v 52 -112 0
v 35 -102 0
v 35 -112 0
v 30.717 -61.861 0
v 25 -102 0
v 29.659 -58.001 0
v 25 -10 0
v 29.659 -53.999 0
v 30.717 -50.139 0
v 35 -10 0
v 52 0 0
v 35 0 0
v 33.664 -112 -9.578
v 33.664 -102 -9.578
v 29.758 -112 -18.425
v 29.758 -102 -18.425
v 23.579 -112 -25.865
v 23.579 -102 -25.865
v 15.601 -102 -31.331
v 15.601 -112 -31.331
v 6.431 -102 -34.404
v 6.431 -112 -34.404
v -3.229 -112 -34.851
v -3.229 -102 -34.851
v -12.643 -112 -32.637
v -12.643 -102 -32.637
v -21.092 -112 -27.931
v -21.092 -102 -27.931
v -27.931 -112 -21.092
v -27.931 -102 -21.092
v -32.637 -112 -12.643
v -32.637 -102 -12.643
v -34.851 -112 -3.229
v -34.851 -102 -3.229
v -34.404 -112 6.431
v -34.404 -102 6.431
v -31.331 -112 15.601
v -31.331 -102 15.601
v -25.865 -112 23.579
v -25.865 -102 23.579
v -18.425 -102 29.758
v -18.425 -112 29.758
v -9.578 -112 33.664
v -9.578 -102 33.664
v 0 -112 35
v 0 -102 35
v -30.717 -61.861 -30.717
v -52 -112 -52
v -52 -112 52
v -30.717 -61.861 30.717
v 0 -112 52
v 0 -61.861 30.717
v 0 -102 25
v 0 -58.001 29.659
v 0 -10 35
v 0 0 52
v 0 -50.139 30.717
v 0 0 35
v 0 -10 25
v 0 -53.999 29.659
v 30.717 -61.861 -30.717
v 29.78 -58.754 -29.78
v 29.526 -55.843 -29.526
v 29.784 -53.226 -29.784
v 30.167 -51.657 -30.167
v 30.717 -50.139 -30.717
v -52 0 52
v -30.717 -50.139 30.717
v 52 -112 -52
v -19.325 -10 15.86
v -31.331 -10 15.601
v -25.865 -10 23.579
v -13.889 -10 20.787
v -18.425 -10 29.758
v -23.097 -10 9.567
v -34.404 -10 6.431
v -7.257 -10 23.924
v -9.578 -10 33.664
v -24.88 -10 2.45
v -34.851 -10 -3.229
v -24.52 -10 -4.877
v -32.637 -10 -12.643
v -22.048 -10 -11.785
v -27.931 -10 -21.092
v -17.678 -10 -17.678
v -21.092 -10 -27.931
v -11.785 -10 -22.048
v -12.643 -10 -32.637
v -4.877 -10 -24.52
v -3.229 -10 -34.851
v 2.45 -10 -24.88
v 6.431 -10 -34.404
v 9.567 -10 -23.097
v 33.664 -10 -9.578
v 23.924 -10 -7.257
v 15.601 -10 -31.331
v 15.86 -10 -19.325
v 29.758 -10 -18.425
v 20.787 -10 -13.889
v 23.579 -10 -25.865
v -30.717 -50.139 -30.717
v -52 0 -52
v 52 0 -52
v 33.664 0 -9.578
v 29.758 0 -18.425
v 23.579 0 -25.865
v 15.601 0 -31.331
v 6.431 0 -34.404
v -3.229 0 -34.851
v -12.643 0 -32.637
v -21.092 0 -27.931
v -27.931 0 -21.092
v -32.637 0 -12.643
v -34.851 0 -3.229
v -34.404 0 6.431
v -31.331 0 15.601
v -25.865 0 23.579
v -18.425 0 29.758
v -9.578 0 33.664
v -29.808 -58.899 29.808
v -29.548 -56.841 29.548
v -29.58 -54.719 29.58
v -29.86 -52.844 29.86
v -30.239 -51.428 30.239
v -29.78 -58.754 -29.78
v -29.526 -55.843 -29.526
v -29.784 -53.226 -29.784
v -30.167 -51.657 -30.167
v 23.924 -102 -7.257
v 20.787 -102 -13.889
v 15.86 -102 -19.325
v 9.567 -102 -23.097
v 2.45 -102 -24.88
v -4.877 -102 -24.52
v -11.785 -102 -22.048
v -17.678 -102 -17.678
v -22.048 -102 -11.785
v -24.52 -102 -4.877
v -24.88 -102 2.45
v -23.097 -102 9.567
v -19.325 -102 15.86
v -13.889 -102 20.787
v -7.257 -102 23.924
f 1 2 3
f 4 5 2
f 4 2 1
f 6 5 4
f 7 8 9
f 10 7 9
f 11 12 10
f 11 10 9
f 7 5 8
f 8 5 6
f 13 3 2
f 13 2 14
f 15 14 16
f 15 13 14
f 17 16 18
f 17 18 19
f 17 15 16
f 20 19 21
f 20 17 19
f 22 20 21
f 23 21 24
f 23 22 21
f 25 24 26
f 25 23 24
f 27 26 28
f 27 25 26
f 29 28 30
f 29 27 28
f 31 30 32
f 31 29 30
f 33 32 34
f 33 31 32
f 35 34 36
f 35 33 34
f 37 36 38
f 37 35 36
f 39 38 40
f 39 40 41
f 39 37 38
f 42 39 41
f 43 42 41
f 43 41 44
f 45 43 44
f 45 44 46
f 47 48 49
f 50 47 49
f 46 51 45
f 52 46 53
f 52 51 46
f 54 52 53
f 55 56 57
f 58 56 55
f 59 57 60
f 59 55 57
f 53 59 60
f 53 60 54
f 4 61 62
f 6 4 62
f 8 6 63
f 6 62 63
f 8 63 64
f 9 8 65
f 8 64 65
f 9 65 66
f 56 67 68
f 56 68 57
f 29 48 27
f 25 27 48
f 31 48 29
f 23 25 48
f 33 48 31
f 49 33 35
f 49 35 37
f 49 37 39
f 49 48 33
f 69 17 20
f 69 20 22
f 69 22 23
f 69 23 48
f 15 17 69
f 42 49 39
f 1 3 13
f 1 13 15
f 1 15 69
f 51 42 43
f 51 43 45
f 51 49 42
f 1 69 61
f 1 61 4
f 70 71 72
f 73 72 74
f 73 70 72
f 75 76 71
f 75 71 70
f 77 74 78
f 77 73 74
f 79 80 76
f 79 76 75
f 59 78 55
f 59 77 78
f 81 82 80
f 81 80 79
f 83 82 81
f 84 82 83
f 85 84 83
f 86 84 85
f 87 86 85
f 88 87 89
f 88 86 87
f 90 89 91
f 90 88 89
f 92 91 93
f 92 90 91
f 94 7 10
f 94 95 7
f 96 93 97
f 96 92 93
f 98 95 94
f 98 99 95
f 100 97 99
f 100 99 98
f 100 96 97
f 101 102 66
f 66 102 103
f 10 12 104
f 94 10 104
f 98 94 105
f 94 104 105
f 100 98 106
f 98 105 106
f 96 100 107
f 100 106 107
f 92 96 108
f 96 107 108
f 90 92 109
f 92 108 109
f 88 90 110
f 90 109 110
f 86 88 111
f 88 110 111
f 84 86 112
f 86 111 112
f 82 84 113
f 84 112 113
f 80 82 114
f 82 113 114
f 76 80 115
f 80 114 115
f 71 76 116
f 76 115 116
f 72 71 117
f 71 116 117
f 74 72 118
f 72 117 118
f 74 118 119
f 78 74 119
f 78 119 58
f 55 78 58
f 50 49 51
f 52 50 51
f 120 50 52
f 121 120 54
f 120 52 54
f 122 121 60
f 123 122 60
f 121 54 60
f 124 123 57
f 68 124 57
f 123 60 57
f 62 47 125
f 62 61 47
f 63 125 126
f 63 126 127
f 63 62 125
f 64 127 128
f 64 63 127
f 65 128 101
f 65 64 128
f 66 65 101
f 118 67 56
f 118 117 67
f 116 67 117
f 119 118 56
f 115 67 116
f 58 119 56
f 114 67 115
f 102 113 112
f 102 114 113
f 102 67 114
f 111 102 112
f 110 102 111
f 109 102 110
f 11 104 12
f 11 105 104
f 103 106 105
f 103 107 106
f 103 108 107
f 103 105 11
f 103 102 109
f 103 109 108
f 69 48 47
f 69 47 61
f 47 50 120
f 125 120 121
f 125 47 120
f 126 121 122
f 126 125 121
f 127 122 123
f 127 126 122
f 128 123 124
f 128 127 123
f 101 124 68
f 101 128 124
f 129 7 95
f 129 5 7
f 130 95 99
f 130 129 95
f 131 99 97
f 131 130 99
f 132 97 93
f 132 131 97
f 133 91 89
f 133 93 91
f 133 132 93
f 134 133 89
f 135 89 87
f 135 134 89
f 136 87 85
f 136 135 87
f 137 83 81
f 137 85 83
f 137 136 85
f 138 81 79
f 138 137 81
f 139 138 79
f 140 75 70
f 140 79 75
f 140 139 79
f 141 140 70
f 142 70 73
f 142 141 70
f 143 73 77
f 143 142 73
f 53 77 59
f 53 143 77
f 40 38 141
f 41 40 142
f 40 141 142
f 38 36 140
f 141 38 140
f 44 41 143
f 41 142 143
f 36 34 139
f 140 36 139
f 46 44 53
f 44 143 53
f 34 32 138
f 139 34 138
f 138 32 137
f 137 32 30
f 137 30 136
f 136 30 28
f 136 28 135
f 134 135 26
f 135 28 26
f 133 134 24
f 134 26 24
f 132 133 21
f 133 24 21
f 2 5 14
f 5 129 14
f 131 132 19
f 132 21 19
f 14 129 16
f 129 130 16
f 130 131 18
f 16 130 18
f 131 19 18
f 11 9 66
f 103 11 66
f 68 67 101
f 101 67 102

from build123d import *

# Parameters (mm, degrees)
ESQUISSE1_W                  = 104
ESQUISSE1_H                  = 104
BOSS_EXTRU_2_DEPTH           = 56
BOSS_EXTRU_2_DRAFT           = -23
SYM_TRIE1_COPY_1_SKETCH_W    = 104
SYM_TRIE1_COPY_1_SKETCH_H    = 104
SYM_TRIE1_COPY_1_DEPTH       = 56
SYM_TRIE1_COPY_1_DRAFT       = -23
ENL_V_MAT_EXTRU_1_DEPTH      = 134.985073796
ENL_V_MAT_EXTRU_1_DEPTH_BACK = 134.985073796
ESQUISSE2_R                  = 25
CONG_1_R                     = 15
ESQUISSE3_W                  = 52
ESQUISSE3_H                  = 52
ENL_V_MAT_EXTRU_2_DEPTH      = 134.985073796
ESQUISSE4_R                  = 35
ENL_V_MAT_EXTRU_3_DEPTH      = 10


with BuildPart() as part:
    # Esquisse1 → Boss.-Extru.2 (with draft: the straight prism first)
    with BuildSketch(Plane(origin=(0, 0, 0), x_dir=(1, 0, 0), z_dir=(0, 1, 0))):
        Rectangle(ESQUISSE1_W, ESQUISSE1_H)
    extrude(amount=-BOSS_EXTRU_2_DEPTH)
    # Boss.-Extru.2: the draft: its side faces are tilted about the plane it starts from
    boss_extru_2_sides = [part.faces().sort_by_distance(p)[0] for p in [
        (-52, -28, 0),
        (0, -28, 52),
        (52, -28, 0),
        (0, -28, -52),
    ]]
    draft(boss_extru_2_sides, Plane(origin=(0, 0, 0), x_dir=(1, 0, 0), z_dir=(0, 1, 0)), BOSS_EXTRU_2_DRAFT)


with BuildPart() as sym_trie1_copy_1_tool:
    # Symétrie1 copy 1 sketch → Symétrie1 copy 1 (with draft: the straight prism first)
    with BuildSketch(Plane.XZ.offset(112)):
        Rectangle(SYM_TRIE1_COPY_1_SKETCH_W, SYM_TRIE1_COPY_1_SKETCH_H)
    extrude(amount=-SYM_TRIE1_COPY_1_DEPTH)
    # Symétrie1 copy 1: the draft: its side faces are tilted about the plane it starts from
    sym_trie1_copy_1_sides = [sym_trie1_copy_1_tool.faces().sort_by_distance(p)[0] for p in [
        (-52, -84, 0),
        (0, -84, 52),
        (52, -84, 0),
        (0, -84, -52),
    ]]
    draft(sym_trie1_copy_1_sides, Plane.XZ.offset(112), SYM_TRIE1_COPY_1_DRAFT)


with BuildPart() as part_1:
    add(part.part)

    # Symétrie1 copy 1: add sym_trie1_copy_1_tool
    add(sym_trie1_copy_1_tool.part)

    # Esquisse2 → Enlèv. mat.-Extru.1 (cut, two sides: drawn at the far end of the back side and taken through both)
    with BuildSketch(Plane(origin=(0, 0, 0), x_dir=(1, 0, 0), z_dir=(0, 1, 0)).offset(-ENL_V_MAT_EXTRU_1_DEPTH_BACK)):
        with Locations(Location((0, 0, 0), (0, 0, 270))):
            Circle(ESQUISSE2_R)
    extrude(amount=ENL_V_MAT_EXTRU_1_DEPTH + ENL_V_MAT_EXTRU_1_DEPTH_BACK, mode=Mode.SUBTRACT)

    # Congé1
    cong_1_edges = [part_1.edges().sort_by_distance(p)[0] for p in [
        (-28.229410292, -56, 0),
        (0, -56, 28.229410292),
        (28.229410292, -56, 0),
        (0, -56, -28.229410292),
    ]]
    fillet(cong_1_edges, radius=CONG_1_R)

    # Esquisse3 → Enlèv. mat.-Extru.2 (cut, through all)
    with BuildSketch(Plane(origin=(0, 0, 0), x_dir=(1, 0, 0), z_dir=(0, 1, 0))):
        with Locations((26, -26)):
            Rectangle(ESQUISSE3_W, ESQUISSE3_H)
    extrude(amount=-ENL_V_MAT_EXTRU_2_DEPTH, mode=Mode.SUBTRACT)

    # Esquisse4 → Enlèv. mat.-Extru.3 (cut)
    with BuildSketch(Plane(origin=(0, 0, 0), x_dir=(1, 0, 0), z_dir=(0, 1, 0))):
        Circle(ESQUISSE4_R)
    enl_v_mat_extru_3 = extrude(amount=-ENL_V_MAT_EXTRU_3_DEPTH, mode=Mode.SUBTRACT)

    # Symétrie2: Enlèv. mat.-Extru.3 across plane
    add(enl_v_mat_extru_3.mirror(Plane.ZX.offset(-56)), mode=Mode.SUBTRACT)


solid = part_1.part
